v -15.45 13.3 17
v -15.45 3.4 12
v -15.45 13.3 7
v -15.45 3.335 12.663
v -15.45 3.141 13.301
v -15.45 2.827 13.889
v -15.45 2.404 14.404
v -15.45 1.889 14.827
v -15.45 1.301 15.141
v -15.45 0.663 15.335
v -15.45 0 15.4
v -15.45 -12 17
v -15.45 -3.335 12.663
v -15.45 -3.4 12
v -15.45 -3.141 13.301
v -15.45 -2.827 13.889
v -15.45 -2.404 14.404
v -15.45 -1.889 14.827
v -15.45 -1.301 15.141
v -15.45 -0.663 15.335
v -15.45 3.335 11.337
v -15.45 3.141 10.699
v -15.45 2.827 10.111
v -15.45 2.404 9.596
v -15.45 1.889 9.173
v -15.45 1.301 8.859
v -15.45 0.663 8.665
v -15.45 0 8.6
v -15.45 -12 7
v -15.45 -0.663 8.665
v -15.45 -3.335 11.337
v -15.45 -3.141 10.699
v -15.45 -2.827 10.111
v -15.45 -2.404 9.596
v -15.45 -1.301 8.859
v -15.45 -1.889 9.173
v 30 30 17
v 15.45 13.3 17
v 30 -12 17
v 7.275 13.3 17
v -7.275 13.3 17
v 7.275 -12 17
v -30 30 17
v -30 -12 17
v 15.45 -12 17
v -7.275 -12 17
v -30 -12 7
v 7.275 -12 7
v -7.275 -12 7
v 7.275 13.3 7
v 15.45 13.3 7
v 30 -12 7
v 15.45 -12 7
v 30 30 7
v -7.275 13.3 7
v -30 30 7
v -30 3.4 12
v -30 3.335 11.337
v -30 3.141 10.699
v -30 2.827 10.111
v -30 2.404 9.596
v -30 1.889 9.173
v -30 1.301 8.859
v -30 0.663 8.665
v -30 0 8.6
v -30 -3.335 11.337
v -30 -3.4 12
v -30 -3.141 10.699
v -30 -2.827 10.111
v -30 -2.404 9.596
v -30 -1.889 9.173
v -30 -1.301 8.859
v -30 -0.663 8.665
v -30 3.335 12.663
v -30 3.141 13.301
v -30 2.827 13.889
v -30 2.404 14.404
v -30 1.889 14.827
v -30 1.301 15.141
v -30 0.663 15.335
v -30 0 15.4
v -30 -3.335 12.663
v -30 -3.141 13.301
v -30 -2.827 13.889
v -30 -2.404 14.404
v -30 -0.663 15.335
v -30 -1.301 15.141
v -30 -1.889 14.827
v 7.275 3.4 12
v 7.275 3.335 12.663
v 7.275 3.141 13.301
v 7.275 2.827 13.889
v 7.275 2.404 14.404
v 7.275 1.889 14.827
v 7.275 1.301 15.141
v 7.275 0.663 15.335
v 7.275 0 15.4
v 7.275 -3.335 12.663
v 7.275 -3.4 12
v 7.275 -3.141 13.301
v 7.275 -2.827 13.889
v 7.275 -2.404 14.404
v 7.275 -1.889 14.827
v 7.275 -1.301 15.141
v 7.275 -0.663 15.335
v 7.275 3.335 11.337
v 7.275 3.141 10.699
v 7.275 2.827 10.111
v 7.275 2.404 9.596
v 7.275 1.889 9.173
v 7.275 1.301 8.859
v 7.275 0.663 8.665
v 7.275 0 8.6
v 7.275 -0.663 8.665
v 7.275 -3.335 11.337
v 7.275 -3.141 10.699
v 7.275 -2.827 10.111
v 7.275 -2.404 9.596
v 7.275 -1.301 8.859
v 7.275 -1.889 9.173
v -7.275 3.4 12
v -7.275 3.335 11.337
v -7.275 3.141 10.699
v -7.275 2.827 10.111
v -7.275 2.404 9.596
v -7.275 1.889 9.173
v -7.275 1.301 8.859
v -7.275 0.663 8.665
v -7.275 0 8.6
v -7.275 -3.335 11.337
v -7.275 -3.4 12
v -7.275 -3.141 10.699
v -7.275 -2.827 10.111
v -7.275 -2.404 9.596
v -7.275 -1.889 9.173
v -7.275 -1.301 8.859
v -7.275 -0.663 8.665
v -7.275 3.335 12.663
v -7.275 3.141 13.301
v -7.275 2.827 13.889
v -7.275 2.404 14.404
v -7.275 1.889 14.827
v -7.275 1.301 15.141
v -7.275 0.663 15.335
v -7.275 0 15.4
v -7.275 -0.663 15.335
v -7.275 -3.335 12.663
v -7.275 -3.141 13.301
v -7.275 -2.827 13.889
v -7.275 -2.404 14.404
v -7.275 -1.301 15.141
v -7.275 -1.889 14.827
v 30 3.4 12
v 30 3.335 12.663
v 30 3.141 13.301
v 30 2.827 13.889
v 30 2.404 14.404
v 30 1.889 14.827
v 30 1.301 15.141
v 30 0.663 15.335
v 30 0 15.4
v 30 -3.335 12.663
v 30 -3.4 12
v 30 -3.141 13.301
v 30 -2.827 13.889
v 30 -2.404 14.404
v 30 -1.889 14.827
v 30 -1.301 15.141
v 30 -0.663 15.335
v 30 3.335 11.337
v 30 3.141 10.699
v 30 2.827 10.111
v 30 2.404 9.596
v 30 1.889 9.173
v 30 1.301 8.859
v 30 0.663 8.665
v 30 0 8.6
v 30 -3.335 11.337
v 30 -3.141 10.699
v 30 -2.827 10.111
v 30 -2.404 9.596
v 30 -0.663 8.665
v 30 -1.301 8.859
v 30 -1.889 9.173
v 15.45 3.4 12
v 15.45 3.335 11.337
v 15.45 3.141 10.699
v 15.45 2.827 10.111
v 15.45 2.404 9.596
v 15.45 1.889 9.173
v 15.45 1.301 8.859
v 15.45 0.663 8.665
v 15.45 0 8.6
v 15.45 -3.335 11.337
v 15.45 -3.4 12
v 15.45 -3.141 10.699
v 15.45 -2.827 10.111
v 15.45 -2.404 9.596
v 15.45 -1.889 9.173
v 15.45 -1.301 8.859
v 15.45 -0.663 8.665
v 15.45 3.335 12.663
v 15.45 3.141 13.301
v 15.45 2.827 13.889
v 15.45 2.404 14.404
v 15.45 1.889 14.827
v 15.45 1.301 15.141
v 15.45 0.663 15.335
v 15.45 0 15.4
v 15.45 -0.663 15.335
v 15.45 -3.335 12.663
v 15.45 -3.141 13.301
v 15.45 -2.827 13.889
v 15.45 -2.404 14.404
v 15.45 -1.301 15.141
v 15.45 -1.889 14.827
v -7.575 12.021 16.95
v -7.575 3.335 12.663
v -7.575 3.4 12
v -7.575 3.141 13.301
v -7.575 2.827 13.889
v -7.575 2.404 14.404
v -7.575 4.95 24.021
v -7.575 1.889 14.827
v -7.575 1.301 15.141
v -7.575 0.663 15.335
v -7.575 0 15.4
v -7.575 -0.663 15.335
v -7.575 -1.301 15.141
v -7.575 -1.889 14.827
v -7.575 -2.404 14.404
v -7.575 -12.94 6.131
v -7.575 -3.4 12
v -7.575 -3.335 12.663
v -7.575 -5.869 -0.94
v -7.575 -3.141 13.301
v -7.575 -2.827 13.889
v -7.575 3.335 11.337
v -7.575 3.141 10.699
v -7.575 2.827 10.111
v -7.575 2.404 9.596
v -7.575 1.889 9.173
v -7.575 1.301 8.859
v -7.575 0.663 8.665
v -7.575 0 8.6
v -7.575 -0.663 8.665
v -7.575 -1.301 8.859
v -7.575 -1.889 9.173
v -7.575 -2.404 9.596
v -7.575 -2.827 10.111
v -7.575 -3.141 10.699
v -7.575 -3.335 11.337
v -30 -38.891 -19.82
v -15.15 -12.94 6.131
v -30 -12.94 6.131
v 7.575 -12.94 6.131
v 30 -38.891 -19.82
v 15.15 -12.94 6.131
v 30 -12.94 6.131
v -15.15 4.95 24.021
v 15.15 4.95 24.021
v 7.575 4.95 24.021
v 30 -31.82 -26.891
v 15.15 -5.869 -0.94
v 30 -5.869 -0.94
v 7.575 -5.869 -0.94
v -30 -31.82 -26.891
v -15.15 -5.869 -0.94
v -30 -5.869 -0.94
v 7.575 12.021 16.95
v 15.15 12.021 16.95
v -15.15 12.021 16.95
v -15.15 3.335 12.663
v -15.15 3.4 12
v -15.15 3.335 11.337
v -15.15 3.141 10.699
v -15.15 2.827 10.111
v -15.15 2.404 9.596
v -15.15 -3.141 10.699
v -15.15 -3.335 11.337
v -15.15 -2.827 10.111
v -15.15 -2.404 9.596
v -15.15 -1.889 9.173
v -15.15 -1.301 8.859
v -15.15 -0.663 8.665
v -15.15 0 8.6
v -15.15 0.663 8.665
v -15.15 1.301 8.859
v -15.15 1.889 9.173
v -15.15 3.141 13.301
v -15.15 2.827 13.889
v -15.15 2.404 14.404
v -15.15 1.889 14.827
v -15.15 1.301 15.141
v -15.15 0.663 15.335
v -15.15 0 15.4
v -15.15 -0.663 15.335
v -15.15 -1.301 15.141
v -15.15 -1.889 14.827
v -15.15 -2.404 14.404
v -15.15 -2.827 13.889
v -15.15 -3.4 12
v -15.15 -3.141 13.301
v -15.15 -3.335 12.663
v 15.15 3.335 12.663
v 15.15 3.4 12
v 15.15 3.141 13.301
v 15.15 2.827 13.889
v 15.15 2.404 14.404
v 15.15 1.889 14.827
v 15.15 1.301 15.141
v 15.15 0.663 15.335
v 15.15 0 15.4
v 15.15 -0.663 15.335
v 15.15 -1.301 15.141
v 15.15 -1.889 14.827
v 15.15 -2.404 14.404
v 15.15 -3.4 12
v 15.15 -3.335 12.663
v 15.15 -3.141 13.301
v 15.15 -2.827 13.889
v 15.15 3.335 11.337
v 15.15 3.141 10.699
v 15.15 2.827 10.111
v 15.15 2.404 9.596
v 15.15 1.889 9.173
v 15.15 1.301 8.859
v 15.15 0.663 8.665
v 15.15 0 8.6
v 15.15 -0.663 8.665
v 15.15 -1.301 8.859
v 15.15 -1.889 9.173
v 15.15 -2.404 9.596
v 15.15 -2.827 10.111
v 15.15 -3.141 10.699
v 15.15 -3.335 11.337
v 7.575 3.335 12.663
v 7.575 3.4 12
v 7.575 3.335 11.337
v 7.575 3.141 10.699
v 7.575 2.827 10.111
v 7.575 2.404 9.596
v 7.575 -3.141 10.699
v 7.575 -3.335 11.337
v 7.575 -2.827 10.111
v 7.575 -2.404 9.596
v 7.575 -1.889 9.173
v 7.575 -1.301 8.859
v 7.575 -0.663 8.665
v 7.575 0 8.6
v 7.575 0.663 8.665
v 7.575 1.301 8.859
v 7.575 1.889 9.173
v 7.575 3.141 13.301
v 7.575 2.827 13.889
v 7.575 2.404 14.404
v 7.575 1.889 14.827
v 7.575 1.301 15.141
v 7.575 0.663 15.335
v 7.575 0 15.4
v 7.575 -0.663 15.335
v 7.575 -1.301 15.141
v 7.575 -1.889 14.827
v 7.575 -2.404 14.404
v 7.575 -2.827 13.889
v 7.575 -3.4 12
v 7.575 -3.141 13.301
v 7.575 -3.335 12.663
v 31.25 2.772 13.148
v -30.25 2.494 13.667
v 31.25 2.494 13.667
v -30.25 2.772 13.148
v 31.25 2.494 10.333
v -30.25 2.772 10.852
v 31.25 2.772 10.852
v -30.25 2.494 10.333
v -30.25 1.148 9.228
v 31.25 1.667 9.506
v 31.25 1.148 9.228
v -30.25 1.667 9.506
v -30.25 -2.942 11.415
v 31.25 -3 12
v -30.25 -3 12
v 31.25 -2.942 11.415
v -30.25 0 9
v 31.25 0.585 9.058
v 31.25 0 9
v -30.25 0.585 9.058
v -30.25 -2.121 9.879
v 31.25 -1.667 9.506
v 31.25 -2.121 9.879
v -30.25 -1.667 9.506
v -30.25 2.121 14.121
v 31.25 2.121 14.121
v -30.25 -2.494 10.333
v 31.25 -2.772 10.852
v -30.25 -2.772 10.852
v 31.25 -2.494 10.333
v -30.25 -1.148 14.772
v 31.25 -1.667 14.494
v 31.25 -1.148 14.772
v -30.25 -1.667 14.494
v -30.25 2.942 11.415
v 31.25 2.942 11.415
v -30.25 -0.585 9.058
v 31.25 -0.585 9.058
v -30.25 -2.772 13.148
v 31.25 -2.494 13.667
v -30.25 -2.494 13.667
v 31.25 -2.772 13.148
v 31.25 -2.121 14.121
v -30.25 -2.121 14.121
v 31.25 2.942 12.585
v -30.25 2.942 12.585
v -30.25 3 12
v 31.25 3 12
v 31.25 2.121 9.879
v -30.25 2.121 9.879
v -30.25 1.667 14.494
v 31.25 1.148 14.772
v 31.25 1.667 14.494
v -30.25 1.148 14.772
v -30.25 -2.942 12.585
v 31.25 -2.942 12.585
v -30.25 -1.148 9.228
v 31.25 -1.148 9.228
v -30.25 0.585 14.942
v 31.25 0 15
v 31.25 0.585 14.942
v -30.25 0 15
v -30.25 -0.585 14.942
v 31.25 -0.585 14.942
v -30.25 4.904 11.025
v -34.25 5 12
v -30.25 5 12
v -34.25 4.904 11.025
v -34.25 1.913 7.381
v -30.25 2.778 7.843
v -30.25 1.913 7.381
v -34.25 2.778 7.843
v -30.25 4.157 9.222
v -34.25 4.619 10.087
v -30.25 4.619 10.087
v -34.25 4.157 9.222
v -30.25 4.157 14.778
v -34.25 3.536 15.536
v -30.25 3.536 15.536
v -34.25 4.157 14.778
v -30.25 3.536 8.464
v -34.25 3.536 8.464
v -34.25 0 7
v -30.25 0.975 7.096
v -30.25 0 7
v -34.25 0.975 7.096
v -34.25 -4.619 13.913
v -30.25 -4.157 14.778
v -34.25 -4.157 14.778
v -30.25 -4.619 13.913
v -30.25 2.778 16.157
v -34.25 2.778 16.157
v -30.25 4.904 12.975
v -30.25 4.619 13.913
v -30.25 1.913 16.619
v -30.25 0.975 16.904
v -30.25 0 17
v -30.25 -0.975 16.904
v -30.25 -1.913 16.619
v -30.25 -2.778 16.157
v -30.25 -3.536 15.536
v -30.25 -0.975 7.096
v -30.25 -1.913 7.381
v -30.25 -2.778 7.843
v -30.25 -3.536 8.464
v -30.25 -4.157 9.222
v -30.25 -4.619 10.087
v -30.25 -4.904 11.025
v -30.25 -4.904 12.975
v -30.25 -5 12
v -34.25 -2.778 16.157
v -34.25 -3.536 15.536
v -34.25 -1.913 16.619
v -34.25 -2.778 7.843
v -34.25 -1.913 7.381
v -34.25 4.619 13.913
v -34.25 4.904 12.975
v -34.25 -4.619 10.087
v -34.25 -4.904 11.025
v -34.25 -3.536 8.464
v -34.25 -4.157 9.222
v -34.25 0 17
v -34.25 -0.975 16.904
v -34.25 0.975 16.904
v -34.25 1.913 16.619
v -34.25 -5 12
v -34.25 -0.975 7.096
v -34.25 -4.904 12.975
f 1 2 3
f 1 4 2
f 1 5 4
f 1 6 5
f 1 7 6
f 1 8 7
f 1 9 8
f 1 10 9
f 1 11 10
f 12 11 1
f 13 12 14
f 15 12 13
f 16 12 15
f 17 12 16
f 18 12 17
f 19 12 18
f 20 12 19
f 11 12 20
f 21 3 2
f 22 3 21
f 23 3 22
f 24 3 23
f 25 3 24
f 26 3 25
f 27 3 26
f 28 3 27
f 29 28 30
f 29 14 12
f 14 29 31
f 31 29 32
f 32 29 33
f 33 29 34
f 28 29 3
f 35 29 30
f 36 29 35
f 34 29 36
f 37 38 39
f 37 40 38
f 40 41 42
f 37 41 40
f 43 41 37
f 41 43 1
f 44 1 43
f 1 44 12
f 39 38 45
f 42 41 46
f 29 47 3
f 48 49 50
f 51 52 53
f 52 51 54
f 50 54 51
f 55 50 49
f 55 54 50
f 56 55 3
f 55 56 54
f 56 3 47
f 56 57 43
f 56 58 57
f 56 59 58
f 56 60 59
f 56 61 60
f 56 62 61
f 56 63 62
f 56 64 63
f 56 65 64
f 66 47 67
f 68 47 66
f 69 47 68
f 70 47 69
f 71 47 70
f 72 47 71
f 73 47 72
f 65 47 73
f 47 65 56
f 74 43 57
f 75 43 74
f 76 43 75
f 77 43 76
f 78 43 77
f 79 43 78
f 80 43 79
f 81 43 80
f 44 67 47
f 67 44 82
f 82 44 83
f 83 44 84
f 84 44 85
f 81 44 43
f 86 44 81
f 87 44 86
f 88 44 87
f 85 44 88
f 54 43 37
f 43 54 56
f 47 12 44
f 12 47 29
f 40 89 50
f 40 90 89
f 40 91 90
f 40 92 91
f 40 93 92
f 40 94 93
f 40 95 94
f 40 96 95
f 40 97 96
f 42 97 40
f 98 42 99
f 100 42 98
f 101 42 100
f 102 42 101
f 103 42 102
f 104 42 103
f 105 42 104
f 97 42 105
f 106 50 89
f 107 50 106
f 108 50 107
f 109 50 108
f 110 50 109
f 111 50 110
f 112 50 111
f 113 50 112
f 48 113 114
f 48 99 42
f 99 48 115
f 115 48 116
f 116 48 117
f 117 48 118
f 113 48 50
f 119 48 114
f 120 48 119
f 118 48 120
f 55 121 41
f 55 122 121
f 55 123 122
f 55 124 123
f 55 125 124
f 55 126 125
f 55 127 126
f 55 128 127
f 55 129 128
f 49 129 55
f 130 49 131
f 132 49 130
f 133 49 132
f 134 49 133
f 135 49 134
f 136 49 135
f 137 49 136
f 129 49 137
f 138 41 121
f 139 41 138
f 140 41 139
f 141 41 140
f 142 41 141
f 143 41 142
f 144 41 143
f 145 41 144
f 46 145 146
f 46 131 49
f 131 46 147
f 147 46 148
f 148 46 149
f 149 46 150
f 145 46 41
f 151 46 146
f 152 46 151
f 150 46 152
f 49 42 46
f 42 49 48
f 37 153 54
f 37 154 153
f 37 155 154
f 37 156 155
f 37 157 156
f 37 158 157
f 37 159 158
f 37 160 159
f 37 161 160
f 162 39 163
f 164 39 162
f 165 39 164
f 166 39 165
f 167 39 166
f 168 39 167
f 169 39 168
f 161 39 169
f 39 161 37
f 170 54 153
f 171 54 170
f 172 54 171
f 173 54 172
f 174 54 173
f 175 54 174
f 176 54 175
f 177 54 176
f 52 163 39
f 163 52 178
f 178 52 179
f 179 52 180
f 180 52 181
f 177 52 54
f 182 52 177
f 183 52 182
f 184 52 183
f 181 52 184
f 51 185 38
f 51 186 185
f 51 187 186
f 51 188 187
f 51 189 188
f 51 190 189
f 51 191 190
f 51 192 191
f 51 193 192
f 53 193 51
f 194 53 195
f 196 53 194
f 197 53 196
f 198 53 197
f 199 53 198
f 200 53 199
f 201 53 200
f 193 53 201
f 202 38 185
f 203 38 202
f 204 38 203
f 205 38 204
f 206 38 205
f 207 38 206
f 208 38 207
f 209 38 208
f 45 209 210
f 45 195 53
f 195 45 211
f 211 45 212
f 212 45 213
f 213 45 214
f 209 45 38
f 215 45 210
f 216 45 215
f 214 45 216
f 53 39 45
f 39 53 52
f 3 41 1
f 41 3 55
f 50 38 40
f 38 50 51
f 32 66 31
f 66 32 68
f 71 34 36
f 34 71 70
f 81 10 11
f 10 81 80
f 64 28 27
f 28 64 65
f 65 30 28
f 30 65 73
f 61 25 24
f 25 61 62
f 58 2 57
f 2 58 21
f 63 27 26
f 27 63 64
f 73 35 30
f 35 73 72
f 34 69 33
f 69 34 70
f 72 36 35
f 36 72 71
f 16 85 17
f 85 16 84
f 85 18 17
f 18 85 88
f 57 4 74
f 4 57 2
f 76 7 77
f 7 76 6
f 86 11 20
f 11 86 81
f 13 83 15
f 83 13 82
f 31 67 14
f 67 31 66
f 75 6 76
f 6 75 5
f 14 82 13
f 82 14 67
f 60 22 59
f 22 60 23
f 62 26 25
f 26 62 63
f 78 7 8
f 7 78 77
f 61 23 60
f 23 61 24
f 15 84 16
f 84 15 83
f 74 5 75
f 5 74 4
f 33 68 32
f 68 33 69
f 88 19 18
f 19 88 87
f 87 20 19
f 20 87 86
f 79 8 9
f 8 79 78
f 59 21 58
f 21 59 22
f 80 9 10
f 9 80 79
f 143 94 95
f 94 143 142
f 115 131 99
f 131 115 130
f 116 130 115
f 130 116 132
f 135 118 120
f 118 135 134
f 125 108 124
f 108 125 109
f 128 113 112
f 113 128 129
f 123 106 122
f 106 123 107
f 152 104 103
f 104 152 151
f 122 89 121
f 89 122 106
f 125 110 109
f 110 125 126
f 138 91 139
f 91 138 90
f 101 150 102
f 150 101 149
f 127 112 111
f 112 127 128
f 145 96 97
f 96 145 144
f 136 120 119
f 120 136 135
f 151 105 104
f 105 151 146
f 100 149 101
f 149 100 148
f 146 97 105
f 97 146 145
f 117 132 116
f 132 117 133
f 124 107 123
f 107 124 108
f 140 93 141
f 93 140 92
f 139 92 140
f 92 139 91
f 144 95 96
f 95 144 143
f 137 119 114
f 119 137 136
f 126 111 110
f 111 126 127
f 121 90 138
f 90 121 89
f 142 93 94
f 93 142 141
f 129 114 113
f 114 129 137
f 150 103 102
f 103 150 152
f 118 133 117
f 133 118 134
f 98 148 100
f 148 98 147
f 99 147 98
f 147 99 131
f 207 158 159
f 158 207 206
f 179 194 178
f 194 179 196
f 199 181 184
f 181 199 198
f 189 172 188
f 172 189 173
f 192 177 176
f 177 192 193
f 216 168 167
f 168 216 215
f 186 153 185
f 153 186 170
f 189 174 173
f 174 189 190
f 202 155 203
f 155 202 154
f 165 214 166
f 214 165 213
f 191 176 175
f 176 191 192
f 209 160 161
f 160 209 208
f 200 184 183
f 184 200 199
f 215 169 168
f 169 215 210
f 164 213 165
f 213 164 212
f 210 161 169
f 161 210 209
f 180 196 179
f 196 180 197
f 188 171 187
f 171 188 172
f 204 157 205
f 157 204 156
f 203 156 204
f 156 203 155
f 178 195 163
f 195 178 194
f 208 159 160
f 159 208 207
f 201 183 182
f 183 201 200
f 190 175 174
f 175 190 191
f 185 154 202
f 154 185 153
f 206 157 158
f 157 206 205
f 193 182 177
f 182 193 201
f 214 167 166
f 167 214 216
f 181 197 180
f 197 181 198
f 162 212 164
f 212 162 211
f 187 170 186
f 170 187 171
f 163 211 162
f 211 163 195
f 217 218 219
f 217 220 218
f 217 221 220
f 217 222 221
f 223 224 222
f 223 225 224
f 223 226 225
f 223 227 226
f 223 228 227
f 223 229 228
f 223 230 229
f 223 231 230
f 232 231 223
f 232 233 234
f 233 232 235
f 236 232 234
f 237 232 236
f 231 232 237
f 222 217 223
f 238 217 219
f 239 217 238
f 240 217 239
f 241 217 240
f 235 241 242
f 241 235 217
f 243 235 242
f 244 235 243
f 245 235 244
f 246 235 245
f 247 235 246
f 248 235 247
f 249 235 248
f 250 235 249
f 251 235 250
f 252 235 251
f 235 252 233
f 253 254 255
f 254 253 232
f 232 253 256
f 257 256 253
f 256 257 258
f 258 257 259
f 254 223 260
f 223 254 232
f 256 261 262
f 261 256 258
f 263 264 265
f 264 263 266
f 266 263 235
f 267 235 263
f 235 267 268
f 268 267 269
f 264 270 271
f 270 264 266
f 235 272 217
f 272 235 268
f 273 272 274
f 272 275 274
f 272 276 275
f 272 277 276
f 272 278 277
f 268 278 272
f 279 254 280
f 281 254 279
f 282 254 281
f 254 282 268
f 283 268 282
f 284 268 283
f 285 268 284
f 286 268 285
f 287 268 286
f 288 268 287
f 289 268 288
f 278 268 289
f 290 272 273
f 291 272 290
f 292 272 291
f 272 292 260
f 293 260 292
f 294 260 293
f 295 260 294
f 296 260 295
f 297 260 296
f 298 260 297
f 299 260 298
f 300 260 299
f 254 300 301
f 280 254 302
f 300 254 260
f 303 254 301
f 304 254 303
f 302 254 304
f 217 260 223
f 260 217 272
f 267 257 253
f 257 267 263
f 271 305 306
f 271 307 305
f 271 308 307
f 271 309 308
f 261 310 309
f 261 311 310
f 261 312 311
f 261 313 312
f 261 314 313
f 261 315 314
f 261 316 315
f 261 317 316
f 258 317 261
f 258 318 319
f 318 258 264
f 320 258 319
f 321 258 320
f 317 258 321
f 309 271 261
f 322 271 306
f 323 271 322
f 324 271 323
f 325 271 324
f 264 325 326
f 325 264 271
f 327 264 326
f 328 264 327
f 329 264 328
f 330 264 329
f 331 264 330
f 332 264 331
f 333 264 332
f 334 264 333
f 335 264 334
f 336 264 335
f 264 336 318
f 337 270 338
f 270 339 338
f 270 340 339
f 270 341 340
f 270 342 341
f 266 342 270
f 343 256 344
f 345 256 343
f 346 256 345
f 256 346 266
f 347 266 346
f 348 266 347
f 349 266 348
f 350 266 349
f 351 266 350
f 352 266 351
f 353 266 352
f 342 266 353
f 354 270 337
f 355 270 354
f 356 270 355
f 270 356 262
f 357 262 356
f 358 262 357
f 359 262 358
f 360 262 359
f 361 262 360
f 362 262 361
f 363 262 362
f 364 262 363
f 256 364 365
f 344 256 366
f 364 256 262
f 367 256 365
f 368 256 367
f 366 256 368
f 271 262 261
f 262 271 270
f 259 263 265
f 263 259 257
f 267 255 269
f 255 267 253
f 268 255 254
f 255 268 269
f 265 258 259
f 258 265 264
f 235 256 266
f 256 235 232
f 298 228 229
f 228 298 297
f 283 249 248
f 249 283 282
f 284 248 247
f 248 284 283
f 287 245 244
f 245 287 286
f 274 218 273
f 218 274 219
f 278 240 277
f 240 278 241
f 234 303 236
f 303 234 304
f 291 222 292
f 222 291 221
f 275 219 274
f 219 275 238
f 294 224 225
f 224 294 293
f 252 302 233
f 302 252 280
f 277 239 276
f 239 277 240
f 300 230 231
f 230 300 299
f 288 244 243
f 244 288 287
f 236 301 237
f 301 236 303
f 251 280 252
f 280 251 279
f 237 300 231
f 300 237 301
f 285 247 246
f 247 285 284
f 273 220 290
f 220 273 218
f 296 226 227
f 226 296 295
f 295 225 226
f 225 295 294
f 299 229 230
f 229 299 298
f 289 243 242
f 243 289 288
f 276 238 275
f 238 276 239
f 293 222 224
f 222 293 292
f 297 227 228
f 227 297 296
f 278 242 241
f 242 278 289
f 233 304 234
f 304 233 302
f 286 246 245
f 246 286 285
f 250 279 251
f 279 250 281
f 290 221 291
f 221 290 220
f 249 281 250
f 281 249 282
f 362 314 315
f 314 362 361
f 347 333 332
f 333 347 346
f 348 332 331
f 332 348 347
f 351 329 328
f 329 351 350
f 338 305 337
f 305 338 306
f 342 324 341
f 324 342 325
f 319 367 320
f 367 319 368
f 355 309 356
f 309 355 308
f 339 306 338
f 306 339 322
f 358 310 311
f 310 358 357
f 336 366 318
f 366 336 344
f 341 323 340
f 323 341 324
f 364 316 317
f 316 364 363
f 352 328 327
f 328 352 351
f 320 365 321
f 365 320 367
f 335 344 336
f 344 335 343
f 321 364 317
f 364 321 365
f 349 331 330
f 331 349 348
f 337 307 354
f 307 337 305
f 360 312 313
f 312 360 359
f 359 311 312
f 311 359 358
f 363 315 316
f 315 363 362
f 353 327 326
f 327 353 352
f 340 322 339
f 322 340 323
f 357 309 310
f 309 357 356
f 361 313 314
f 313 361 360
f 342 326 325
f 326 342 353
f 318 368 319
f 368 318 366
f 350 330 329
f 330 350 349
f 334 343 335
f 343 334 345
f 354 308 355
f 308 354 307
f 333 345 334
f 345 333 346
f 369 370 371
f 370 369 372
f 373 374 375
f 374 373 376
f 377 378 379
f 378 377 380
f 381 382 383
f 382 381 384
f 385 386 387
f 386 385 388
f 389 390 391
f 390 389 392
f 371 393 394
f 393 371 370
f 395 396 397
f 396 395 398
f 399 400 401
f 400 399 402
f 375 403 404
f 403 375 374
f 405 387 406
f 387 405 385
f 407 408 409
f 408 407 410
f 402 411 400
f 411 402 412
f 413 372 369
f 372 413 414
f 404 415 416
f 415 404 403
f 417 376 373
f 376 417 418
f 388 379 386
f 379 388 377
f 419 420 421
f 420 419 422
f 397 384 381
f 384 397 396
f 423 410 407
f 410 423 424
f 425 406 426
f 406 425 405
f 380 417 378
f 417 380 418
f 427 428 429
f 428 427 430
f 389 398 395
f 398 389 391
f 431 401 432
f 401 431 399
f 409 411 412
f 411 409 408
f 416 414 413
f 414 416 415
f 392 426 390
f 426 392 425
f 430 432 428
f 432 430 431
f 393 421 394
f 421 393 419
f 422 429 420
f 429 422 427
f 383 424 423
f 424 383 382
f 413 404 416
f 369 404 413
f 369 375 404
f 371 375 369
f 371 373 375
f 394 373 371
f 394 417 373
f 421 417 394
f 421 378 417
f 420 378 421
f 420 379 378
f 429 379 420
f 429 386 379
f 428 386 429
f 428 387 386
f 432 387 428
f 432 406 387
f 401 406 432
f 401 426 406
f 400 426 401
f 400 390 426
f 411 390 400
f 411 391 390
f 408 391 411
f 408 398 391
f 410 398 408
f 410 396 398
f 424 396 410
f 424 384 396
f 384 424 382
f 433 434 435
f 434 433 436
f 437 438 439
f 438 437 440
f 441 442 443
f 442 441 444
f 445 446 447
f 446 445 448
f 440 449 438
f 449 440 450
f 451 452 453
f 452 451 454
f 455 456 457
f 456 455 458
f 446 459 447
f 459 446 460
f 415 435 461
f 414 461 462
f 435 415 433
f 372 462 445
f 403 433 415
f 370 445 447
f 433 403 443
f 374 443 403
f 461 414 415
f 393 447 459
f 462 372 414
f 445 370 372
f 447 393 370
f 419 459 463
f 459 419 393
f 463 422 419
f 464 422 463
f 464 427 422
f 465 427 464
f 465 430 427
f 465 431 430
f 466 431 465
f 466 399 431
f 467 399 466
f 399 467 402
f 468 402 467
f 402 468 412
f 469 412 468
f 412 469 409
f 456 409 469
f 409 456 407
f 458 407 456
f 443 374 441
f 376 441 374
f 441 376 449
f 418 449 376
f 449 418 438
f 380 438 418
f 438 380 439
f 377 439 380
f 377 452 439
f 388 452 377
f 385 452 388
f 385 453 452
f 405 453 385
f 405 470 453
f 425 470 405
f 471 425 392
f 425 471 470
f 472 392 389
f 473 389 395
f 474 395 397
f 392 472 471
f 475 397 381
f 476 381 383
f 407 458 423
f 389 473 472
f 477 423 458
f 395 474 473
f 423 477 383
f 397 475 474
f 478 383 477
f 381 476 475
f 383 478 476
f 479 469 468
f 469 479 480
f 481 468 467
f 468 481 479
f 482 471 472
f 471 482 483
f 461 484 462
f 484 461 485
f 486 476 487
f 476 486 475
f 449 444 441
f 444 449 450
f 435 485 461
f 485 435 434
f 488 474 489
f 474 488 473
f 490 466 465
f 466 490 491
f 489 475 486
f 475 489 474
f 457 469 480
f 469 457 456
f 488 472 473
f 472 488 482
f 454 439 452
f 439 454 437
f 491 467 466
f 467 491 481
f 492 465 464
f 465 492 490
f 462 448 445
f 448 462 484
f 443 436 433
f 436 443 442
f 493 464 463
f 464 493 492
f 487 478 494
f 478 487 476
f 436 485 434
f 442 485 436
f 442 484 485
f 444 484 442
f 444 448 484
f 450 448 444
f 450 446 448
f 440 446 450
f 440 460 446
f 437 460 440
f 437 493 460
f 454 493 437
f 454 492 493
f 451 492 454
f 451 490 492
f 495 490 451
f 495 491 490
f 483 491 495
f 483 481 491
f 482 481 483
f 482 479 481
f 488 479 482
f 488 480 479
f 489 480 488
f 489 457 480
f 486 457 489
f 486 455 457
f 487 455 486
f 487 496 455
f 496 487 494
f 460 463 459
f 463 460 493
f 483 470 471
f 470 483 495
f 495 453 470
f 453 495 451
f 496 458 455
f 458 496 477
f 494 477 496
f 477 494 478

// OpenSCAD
$fn = 32;

// ------------------------------------------------------------------------
// Butt hinge: hinge 60 mm, leaf swung 45 deg
// Every part is its own module, assembly() places every instance.
// ------------------------------------------------------------------------

// --- part 1 ---
module hinge_base() {
  difference() {
    union() {
      translate([-30, -12, -5]) cube([14.55, 42, 10]);
      translate([-7.275, -12, -5]) cube([14.55, 42, 10]);
      translate([15.45, -12, -5]) cube([14.55, 42, 10]);
      translate([-30, 13.3, -5]) cube([60, 16.7, 10]);
    }
    translate([-22.725, 0, 0]) rotate([0, 90, 0]) cylinder(h = 16.55, d = 6.8, center = true);
    translate([0, 0, 0]) rotate([0, 90, 0]) cylinder(h = 16.55, d = 6.8, center = true);
    translate([22.725, 0, 0]) rotate([0, 90, 0]) cylinder(h = 16.55, d = 6.8, center = true);
  }
}

// --- part 2 ---
module hinge_mover() {
  difference() {
    union() {
      translate([-15.15, -50, -5]) cube([7.575, 62, 10]);
      translate([7.575, -50, -5]) cube([7.575, 62, 10]);
      translate([-30, -50, -5]) cube([60, 36.7, 10]);
    }
    translate([-11.362, 0, 0]) rotate([0, 90, 0]) cylinder(h = 9.575, d = 6.8, center = true);
    translate([11.362, 0, 0]) rotate([0, 90, 0]) cylinder(h = 9.575, d = 6.8, center = true);
  }
}

// --- part 3 ---
module hinge_pin() {
  rotate([0, 90, 0]) cylinder(h = 62.5, d = 6, center = true);
  translate([-34.25, 0, 0]) rotate([0, 90, 0]) cylinder(h = 4, d = 10);
}

// --- assembly ---
module assembly() {
  color([0.80, 0.24, 0.20]) translate([0, 0, 12]) rotate([0, 0, 0]) hinge_base();
  color([0.20, 0.45, 0.75]) translate([0, 0, 12]) rotate([45, 0, 0]) hinge_mover();
  color([0.25, 0.62, 0.32]) translate([0, 0, 12]) rotate([0, 0, 0]) hinge_pin();
}

assembly();
